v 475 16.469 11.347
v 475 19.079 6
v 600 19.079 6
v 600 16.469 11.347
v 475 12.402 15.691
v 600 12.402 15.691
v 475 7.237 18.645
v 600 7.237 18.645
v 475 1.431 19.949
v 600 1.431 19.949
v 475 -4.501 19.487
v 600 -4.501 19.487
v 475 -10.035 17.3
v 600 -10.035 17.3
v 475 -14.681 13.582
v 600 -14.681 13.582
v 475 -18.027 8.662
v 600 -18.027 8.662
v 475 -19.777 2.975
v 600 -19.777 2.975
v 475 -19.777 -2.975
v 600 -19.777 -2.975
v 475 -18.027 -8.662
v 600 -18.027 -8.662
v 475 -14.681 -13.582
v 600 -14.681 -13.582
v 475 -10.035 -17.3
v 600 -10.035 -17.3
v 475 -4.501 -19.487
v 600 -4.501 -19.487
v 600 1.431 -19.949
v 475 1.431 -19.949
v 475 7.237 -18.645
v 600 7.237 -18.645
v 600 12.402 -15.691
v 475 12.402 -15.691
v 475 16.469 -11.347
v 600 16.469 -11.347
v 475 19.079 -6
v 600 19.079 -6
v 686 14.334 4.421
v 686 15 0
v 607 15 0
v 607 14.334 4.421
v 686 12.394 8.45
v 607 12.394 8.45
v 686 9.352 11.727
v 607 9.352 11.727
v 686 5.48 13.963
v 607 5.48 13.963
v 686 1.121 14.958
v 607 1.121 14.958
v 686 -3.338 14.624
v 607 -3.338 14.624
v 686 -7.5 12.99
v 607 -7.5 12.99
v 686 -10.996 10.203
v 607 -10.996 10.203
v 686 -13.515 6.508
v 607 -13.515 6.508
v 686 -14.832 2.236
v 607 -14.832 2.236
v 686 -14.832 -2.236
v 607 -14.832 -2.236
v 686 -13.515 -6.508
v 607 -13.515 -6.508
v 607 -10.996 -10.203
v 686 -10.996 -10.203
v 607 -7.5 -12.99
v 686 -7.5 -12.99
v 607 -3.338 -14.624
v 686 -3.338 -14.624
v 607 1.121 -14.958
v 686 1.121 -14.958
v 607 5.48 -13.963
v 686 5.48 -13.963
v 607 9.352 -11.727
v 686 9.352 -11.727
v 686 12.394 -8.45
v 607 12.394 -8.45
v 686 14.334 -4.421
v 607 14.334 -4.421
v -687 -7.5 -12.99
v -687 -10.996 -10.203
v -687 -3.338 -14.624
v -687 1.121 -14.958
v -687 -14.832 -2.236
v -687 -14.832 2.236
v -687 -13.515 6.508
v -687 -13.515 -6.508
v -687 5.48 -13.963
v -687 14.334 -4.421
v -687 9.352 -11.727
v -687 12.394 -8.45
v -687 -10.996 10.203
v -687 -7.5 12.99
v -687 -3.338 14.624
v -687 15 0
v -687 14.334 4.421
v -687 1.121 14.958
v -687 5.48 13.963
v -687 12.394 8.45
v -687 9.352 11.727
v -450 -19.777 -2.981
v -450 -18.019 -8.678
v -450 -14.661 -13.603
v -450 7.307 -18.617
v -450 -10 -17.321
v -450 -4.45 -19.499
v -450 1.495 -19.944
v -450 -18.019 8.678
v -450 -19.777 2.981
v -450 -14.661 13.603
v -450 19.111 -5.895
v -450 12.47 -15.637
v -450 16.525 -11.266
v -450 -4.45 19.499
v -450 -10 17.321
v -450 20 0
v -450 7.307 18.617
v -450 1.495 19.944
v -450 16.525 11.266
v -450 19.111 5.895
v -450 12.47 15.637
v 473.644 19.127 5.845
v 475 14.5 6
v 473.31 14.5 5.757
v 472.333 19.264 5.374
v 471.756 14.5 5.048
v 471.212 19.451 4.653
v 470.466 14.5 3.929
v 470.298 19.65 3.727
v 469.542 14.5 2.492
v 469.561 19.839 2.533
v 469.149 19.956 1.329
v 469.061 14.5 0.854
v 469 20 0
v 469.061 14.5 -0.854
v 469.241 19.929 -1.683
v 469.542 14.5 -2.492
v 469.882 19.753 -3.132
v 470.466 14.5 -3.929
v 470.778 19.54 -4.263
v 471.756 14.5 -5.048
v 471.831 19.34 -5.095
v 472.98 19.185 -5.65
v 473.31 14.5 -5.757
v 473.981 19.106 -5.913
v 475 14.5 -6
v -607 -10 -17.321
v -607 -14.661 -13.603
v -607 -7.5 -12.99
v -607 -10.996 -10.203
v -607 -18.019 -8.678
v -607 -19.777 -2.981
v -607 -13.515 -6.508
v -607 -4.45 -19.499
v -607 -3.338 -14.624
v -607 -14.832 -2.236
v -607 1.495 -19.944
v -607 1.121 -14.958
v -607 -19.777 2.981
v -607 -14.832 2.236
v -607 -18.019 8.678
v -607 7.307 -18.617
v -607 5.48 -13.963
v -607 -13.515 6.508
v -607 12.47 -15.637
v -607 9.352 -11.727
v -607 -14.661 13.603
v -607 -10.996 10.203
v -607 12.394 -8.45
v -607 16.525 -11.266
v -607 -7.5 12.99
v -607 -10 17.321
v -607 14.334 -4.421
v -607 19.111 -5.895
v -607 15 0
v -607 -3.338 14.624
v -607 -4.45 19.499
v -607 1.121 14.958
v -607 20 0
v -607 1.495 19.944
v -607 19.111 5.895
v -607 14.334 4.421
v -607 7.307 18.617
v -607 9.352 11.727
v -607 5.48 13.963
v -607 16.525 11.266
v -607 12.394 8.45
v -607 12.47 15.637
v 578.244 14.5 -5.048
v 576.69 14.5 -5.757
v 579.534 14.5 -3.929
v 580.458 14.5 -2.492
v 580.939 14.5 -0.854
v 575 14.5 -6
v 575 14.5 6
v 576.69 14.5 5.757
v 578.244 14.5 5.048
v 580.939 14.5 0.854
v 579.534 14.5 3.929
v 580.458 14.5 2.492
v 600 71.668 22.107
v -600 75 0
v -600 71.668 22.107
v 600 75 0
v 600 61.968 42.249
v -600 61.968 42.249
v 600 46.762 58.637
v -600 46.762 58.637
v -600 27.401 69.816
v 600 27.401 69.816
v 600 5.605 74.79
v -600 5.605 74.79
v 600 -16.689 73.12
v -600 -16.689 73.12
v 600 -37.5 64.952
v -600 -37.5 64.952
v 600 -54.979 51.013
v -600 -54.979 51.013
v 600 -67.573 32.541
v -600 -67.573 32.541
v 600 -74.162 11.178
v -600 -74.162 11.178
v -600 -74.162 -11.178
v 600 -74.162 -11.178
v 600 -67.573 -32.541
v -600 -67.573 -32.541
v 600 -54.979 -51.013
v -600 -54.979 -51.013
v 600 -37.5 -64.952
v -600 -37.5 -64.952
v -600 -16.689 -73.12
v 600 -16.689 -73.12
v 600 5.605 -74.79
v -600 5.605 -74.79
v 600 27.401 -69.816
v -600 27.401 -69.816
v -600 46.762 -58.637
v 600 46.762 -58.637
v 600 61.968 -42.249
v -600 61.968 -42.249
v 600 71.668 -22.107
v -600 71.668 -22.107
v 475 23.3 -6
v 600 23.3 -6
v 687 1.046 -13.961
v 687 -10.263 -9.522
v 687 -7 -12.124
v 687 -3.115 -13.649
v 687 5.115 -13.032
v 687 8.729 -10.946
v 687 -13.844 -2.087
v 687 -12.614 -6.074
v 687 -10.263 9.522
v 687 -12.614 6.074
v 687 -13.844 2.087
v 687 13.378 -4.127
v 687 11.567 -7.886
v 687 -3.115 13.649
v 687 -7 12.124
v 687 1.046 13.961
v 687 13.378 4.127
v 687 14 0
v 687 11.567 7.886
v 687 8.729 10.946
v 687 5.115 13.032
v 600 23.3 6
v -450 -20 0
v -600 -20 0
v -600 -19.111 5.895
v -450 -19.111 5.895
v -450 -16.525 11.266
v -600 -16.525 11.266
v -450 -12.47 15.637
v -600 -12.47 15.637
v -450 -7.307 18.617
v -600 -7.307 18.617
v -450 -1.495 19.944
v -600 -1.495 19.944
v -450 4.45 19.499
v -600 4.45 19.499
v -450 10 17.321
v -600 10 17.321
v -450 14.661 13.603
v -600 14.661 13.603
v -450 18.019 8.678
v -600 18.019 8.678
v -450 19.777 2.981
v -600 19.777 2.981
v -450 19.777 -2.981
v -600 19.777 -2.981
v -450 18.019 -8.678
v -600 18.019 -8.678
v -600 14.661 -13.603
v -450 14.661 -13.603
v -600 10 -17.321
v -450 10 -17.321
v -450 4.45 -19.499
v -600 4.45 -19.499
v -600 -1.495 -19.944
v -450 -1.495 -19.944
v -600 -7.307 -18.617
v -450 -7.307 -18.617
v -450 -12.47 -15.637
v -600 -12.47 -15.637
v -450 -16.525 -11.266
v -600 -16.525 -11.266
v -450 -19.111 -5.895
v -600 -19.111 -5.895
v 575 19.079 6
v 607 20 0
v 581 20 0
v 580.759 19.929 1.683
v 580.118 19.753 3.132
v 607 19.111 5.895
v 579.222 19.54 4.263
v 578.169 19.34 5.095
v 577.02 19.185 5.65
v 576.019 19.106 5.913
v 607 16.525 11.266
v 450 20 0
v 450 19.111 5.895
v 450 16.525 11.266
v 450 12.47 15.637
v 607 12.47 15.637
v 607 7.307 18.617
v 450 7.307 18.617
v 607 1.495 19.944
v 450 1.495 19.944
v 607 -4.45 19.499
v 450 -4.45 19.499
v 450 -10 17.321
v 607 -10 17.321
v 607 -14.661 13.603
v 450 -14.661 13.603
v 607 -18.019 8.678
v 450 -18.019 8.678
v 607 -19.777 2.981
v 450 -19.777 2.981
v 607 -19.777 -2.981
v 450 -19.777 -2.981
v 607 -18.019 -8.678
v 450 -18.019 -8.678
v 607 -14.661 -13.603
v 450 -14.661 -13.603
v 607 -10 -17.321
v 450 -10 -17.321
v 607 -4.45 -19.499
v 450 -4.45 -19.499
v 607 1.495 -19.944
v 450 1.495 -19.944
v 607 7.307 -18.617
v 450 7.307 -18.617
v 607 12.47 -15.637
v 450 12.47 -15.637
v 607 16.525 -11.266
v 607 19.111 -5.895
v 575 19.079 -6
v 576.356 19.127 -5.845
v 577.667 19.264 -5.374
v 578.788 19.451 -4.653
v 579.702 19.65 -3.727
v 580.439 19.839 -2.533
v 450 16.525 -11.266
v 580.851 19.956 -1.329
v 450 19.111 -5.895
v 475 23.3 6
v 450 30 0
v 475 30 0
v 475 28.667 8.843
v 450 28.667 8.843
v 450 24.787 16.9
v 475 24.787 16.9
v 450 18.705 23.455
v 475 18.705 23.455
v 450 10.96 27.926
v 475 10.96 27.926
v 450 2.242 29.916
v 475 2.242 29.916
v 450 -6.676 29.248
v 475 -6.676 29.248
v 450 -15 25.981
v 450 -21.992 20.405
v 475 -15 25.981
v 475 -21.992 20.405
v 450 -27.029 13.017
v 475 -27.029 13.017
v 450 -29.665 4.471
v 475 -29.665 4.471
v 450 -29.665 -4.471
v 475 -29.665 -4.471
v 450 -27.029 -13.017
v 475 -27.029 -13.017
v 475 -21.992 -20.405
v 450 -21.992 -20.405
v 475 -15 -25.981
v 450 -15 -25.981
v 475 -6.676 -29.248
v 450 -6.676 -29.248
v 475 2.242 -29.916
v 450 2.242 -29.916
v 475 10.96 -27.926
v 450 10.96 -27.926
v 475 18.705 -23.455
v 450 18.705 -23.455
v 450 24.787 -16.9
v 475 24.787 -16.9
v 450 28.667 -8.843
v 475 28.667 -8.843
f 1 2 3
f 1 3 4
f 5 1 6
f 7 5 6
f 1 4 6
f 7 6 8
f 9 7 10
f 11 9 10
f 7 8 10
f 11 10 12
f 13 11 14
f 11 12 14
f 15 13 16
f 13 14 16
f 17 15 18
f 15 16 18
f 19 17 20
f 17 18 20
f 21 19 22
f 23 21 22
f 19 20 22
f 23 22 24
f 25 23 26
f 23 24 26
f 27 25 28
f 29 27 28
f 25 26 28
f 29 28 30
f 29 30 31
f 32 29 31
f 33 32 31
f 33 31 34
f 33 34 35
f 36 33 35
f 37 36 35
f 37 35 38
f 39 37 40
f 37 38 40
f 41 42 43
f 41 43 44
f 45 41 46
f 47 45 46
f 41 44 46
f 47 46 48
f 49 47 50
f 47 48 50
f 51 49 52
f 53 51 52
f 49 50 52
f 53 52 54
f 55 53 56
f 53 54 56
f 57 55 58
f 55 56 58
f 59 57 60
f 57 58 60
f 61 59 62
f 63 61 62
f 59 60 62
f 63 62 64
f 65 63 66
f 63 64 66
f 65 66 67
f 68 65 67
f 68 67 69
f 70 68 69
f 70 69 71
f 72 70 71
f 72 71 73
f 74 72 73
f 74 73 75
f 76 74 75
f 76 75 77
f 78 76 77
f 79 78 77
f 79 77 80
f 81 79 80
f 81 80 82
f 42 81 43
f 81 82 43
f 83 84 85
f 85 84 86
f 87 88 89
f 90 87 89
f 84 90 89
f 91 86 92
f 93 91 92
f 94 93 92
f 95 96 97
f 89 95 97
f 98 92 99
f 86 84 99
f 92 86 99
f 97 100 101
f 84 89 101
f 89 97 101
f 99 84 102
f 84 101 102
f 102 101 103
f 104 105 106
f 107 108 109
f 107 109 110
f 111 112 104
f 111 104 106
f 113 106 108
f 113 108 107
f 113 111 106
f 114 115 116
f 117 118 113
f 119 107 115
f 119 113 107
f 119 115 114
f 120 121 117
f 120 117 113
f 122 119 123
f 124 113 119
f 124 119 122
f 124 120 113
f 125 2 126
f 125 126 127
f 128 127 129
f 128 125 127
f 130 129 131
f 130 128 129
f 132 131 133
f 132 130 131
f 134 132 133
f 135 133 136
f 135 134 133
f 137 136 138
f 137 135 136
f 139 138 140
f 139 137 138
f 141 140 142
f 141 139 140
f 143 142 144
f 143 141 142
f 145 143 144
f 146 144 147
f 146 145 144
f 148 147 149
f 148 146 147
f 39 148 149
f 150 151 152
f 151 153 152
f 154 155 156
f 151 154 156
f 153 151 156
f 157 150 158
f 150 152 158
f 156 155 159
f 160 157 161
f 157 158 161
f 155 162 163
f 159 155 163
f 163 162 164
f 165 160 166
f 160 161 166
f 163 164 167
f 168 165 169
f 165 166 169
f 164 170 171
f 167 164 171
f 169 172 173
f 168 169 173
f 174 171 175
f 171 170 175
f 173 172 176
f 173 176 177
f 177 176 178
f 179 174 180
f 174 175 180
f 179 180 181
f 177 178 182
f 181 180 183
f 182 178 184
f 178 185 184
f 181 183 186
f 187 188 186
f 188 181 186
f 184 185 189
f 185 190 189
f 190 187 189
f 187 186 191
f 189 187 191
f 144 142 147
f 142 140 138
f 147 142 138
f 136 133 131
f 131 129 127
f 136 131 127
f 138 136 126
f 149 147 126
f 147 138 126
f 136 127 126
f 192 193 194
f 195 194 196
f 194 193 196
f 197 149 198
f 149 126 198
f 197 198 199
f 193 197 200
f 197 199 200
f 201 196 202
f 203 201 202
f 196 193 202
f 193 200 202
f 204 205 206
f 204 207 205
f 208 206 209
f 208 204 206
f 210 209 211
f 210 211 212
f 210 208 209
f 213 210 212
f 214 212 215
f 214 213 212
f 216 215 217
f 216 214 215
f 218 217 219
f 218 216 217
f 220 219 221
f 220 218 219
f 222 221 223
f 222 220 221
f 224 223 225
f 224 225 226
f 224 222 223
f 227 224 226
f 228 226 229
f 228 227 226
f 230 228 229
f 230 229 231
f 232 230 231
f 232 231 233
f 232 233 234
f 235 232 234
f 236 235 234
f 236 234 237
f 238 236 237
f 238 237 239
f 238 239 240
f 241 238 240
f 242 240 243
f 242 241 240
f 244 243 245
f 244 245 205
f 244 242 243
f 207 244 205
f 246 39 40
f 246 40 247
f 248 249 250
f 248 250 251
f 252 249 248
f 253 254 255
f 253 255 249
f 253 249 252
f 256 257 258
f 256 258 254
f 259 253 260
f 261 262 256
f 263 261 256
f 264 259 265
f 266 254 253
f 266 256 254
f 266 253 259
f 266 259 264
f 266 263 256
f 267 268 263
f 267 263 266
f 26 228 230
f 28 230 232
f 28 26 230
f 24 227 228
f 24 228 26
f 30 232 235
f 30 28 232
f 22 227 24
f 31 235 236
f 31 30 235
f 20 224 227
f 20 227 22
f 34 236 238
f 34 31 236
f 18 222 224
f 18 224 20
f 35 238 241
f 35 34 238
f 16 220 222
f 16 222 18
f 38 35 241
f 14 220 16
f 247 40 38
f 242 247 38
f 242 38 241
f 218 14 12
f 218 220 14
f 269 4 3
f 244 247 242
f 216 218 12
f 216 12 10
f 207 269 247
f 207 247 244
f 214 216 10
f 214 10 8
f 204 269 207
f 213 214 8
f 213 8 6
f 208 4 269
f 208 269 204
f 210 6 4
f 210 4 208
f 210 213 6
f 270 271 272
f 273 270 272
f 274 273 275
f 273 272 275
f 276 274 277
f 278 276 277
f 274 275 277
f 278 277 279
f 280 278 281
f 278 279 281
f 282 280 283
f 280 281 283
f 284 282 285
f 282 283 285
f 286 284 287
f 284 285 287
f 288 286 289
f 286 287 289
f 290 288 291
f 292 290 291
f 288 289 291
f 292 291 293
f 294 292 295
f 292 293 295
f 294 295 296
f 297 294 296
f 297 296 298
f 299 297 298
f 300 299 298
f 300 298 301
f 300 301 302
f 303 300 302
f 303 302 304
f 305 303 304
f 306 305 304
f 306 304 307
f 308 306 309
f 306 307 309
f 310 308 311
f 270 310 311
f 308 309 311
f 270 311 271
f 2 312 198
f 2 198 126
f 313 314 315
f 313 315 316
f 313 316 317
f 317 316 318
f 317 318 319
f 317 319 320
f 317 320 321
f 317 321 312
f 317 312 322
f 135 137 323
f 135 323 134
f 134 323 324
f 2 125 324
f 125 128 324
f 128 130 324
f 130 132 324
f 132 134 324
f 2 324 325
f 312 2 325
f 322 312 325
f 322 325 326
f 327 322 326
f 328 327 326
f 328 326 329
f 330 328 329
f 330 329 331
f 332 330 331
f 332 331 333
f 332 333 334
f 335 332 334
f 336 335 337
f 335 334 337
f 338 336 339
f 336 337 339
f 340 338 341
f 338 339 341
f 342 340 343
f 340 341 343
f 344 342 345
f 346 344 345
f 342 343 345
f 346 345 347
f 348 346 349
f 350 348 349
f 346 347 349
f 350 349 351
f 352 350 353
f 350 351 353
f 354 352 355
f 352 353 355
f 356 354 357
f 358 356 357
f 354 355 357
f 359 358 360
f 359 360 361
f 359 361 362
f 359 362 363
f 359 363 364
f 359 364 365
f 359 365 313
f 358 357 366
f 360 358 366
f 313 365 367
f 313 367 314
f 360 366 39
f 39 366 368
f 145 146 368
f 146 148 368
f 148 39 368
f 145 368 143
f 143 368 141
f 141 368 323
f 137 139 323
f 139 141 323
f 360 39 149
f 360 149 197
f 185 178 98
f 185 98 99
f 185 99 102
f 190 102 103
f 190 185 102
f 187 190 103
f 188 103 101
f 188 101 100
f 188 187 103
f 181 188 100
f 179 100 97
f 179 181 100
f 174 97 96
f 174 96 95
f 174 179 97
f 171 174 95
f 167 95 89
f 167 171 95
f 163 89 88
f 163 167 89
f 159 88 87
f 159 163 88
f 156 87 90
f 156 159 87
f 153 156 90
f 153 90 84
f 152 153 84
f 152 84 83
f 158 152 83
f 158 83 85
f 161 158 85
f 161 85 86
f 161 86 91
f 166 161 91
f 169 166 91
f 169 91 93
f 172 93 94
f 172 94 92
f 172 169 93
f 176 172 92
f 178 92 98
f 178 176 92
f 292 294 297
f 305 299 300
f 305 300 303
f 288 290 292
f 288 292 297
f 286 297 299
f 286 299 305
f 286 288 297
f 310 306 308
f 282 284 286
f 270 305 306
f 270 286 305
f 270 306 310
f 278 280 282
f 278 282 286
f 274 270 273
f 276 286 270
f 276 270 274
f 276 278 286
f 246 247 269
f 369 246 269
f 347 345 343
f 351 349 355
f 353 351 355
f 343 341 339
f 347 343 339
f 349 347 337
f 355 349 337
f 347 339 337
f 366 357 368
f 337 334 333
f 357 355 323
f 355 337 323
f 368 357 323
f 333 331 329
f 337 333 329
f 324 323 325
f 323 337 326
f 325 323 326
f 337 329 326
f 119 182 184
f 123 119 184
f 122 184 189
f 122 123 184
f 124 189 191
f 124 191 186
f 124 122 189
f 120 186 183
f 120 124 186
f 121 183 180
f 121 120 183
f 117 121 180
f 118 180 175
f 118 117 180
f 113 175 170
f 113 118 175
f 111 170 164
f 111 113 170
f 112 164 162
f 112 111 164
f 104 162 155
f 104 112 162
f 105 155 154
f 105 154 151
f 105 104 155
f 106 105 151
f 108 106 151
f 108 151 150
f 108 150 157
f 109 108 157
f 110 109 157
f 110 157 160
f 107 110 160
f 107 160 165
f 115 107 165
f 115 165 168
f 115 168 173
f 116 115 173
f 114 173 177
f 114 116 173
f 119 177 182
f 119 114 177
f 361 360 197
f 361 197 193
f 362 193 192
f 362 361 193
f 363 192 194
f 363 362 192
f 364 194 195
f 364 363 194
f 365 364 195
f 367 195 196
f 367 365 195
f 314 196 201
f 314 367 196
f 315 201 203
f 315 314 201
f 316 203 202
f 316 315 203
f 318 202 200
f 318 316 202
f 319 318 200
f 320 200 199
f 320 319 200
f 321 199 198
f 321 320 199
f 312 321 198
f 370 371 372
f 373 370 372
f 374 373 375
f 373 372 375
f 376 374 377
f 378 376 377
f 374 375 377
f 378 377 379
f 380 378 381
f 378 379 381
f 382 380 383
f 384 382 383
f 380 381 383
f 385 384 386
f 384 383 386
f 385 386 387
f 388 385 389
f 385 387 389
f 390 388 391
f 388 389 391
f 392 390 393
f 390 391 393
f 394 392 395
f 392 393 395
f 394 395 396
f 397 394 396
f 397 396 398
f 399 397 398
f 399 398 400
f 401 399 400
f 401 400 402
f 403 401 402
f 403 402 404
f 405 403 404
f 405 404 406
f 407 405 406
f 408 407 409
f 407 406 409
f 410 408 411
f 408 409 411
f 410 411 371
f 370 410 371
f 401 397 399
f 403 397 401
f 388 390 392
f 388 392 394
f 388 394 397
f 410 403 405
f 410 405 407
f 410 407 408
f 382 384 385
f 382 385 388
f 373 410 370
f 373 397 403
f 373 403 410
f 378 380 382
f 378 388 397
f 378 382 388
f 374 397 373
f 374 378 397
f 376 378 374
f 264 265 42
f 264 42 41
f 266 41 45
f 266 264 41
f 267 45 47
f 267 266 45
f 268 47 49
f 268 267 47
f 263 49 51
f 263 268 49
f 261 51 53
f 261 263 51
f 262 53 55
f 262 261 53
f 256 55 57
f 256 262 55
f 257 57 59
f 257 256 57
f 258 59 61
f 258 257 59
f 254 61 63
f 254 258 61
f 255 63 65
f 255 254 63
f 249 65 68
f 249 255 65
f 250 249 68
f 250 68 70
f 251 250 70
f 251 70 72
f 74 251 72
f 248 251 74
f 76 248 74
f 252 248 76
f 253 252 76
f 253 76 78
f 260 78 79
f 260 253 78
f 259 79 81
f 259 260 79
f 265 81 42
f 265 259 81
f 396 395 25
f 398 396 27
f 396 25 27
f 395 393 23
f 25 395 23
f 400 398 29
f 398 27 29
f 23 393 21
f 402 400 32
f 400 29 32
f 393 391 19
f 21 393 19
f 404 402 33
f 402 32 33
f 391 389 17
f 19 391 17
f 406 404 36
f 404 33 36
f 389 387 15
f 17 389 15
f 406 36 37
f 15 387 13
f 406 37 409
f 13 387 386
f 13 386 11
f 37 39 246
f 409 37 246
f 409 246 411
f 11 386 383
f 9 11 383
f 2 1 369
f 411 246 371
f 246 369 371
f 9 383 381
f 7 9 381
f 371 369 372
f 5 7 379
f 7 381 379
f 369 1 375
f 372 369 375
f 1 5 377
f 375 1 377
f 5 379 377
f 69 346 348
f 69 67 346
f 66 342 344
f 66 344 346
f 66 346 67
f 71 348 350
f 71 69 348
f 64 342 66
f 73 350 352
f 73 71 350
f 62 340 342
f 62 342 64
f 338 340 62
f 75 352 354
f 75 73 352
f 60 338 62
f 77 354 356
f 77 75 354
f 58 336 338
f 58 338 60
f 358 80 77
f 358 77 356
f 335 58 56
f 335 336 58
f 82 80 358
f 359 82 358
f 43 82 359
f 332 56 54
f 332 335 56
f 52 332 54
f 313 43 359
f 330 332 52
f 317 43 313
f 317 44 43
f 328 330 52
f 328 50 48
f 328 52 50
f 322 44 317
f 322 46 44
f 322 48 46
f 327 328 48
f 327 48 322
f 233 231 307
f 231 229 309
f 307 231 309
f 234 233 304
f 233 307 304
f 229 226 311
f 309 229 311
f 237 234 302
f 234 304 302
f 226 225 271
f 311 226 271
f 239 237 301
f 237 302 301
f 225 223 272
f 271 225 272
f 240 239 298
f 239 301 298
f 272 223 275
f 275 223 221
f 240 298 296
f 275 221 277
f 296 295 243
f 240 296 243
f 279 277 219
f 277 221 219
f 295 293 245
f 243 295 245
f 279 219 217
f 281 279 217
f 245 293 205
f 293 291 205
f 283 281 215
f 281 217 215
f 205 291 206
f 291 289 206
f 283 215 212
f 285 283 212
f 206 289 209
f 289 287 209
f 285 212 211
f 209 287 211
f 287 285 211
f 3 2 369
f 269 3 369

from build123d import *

# Parameters (mm, degrees)
F0_R      = 75
F1_DEPTH  = 600
F2_R      = 20
F3_DEPTH  = 150
F4_R      = 20
F5_DEPTH  = 150
F6_W      = 4.2212159717
F6_H      = 12
F7_DEPTH  = 125
F8_R      = 20
F9_DEPTH  = 157
F10_R     = 15
F11_DEPTH = 80
F14_DEPTH = 8.8
F16_R     = 30
F17_DEPTH = 25
F18_DEPTH = 92
F19_SIZE  = 1


with BuildPart() as f1:
    # F0 (on Right) → F1 (new body, symmetric)
    with BuildSketch(Plane.YZ):
        Circle(F0_R)
    extrude(amount=F1_DEPTH, both=True)

    # F2 (on face) → F3 (cut)
    with BuildSketch(Plane.YZ.offset(600)):
        Circle(F2_R)
    extrude(amount=-F3_DEPTH, mode=Mode.SUBTRACT)

    # F4 (on face) → F5 (cut)
    with BuildSketch(Plane(origin=(-600, 0, 0), x_dir=(0, -1, 0), z_dir=(-1, 0, 0))):
        Circle(F4_R)
    extrude(amount=-F5_DEPTH, mode=Mode.SUBTRACT)

    # F6 (on face) → F7 (cut)
    with BuildSketch(Plane.YZ.offset(600)):
        with Locations((21.1893920142, 0)):
            Rectangle(F6_W, F6_H)
    extrude(amount=-F7_DEPTH, mode=Mode.SUBTRACT)


with BuildPart() as f9:
    # F8 (on face) → F9 (new body)
    with BuildSketch(Plane.YZ.offset(450)):
        Circle(F8_R)
    extrude(amount=F9_DEPTH)

    # F10 (on face) → F11 (join)
    with BuildSketch(Plane.YZ.offset(607)):
        Circle(F10_R)
    extrude(amount=F11_DEPTH)


with BuildPart() as f12_1:
    # F12: instance of F9
    add(f9.part.mirror(Plane.YZ))

    # F18 (add): a face of the model
    f18_faces = [f12_1.faces().sort_by_distance(p)[0] for p in [
        (-687, 0, 0),
    ]]
    extrude(f18_faces, amount=-F18_DEPTH)


with BuildPart() as f14_tool:
    # F13 (on face) → F14 (new body)
    with BuildSketch(Plane.XZ.offset(-23.3)):
        with BuildLine():
            ThreePointArc((475, 6), (469, 0), (475, -6))
            Line((475, -6), (575, -6))
            ThreePointArc((575, -6), (581, 0), (575, 6))
            Line((575, 6), (475, 6))
        make_face()
    extrude(amount=F14_DEPTH)


with BuildPart() as f1_1:
    add(f1.part)

    # F14: cut by f14_tool
    add(f14_tool.part, mode=Mode.SUBTRACT)

    # F16 (on offset) → F17 (cut)
    with BuildSketch(Plane.YZ.offset(475)):
        Circle(F16_R)
    extrude(amount=-F17_DEPTH, mode=Mode.SUBTRACT)


with BuildPart() as f9_1:
    add(f9.part)

    # F14: cut by f14_tool
    add(f14_tool.part, mode=Mode.SUBTRACT)

    # F19
    f19_edges = [f9_1.edges().sort_by_distance(p)[0] for p in [
        (687, -15, 0),
    ]]
    chamfer(f19_edges, length=F19_SIZE)


solid = Compound([f12_1.part, f1_1.part, f9_1.part])
